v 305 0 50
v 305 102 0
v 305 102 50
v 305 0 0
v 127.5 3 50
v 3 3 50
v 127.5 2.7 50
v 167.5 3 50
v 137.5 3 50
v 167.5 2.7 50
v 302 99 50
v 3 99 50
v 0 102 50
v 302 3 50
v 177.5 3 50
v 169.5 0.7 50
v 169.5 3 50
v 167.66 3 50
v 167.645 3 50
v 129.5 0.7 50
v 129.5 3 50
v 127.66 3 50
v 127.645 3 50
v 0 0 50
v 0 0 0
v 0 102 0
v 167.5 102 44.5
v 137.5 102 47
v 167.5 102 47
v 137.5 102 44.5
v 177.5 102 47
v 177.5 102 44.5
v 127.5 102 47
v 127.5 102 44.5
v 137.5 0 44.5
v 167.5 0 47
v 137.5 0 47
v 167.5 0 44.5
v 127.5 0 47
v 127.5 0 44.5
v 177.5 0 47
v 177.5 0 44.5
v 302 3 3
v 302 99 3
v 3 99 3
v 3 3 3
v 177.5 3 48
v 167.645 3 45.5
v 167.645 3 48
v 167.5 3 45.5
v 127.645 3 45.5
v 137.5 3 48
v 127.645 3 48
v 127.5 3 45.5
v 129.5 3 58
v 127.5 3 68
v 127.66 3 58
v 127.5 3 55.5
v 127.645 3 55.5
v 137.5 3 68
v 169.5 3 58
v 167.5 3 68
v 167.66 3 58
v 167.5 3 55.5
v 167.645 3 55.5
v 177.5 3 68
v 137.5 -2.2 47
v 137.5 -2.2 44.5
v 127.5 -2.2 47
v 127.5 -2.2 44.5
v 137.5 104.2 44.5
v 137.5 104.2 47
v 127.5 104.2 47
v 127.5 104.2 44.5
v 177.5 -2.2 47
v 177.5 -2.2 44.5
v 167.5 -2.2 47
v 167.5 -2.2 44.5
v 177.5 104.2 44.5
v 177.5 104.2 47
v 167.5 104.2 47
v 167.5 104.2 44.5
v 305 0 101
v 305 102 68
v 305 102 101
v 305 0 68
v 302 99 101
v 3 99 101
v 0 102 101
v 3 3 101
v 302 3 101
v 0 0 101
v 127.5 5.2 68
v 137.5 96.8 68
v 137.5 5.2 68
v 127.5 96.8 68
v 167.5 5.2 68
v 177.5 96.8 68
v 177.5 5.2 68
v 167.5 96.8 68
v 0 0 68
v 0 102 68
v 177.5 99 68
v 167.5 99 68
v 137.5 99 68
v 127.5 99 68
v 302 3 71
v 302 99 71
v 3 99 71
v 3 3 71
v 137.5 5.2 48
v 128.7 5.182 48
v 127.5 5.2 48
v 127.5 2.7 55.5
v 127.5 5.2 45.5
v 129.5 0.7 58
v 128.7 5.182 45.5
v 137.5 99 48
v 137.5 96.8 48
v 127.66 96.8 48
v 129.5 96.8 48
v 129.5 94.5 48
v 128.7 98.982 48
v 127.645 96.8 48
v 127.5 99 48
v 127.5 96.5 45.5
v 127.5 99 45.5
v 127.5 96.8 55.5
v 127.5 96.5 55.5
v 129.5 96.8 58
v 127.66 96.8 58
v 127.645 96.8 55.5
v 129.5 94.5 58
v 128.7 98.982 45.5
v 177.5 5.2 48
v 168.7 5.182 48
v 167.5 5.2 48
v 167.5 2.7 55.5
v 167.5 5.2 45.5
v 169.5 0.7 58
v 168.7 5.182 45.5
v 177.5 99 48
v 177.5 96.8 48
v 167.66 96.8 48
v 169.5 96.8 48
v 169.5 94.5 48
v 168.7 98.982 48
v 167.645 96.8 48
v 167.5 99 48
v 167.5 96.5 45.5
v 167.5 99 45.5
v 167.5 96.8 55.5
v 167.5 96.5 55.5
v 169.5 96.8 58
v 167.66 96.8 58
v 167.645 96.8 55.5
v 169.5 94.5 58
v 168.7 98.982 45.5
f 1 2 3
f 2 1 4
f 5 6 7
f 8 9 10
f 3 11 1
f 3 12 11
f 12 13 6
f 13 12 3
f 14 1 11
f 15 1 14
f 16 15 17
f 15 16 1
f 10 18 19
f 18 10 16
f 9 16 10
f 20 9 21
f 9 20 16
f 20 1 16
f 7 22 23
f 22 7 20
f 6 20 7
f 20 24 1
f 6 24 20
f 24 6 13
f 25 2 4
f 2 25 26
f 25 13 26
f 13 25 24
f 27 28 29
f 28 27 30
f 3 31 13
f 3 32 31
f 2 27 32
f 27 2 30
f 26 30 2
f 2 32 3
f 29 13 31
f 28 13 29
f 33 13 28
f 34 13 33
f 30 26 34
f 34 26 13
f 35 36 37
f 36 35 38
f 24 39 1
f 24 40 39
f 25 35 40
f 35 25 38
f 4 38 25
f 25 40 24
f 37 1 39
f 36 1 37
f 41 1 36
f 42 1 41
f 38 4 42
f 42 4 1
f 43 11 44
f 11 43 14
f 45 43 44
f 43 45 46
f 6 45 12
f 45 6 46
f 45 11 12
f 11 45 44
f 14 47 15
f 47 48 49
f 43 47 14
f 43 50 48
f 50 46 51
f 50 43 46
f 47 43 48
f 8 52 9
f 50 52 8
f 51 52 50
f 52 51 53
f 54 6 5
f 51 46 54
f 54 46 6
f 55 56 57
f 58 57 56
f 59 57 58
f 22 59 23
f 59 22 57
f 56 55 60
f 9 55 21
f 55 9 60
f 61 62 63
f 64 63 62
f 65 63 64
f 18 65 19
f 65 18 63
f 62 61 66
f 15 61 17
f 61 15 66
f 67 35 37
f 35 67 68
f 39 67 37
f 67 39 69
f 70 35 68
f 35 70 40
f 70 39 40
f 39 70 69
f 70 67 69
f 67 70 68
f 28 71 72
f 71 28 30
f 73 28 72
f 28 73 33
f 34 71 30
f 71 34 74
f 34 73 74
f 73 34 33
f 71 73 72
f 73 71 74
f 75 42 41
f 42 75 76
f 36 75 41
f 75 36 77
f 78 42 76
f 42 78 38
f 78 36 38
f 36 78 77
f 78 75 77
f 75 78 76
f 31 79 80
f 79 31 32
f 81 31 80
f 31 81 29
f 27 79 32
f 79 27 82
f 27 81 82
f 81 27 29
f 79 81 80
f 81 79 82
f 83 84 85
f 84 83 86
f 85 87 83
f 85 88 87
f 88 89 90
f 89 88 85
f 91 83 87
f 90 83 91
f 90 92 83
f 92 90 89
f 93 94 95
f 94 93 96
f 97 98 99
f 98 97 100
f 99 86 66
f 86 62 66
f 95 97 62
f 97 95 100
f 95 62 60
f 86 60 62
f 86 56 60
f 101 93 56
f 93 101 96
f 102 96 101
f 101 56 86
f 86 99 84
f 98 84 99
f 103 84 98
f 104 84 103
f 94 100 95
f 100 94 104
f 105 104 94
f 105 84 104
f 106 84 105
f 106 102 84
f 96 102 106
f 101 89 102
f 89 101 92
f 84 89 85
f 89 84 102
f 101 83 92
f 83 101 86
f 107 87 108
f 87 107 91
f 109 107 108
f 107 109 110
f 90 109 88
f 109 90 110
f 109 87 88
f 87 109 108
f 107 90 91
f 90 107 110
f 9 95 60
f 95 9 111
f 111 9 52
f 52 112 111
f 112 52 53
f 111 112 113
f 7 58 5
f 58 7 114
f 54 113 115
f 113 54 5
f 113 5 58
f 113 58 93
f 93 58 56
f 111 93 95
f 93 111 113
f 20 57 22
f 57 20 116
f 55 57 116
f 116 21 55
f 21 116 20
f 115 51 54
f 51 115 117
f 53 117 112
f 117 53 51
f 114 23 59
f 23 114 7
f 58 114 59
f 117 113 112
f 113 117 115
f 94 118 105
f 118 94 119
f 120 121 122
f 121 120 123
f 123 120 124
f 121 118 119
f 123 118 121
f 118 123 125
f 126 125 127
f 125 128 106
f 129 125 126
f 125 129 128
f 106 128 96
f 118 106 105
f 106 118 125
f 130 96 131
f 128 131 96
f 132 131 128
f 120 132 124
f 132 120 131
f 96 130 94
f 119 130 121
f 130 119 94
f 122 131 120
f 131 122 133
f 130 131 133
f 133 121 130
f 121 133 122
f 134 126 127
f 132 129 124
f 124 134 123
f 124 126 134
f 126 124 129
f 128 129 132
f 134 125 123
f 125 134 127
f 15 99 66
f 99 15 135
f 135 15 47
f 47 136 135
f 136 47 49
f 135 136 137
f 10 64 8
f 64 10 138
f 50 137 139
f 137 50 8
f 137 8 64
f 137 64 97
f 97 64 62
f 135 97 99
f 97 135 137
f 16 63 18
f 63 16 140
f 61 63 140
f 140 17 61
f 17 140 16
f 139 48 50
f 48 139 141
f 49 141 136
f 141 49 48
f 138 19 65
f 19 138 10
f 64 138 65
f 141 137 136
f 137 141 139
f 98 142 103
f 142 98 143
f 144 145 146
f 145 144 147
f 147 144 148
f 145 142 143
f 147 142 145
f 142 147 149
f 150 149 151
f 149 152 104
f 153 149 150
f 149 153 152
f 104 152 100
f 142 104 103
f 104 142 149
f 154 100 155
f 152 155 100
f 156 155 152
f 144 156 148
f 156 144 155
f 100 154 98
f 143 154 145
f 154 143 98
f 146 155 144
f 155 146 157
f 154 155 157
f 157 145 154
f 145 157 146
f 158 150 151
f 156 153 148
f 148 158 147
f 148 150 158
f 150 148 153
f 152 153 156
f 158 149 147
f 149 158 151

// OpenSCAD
// 03_finger_latches.scad
// Flexible finger latches: two pairs of tall, slender cantilever fingers
// on the SHORT ends (Y faces) of the upper tray. Each finger has a wedge
// hook tip that grabs a small ledge printed on the lower tray's end wall.
// The long flexible arm gives easy manual release — just squeeze the pair inward.
// Engage: press down; ramp guides hooks past ledge. Release: pinch pair, lift.

$fn = 36;
EXPLODE = 18;   // 0=engaged, >0=exploded

/* ---- tray dimensions ---- */
LX = 305; LY = 102; LZ = 50;
UX = 305; UY = 102; UZ = 33;
W  = 3;

/* ---- finger params ---- */
FW   = 10;    // finger width
FT   = 2.2;   // finger thickness (flex direction)
FL   = 20;    // free arm length (provides flex)
HOOK_H = 2.5; // hook catch height
HOOK_D = 2.0; // hook protrusion depth
RAMP_A = 40;  // ramp angle (degrees) for self-guiding on press
LEDGE_H = 2.5;
LEDGE_D = 2.2;

// X position: fingers centered on each short end, spaced apart
FSPACING = 40;  // centre-to-centre of finger pair
FX1 = UX/2 - FSPACING/2 - FW/2;
FX2 = UX/2 + FSPACING/2 - FW/2;

module lower_tray() {
    color("SteelBlue", 0.85)
    union() {
        difference() {
            cube([LX, LY, LZ]);
            translate([W, W, W]) cube([LX-2*W, LY-2*W, LZ]);
        }
        // Ledge on front short face (X=0 end... no, short face = Y=0 and Y=LY)
        // Actually short end = Y faces (102mm dimension): two ledges on Y=0 face
        for (xp = [FX1, FX2]) {
            // ledge on front face (Y=0), protrudes outward (-Y)
            translate([xp, -LEDGE_D, LZ - LEDGE_H - FL*0.15])
                cube([FW, LEDGE_D, LEDGE_H]);
            // ledge on back face (Y=LY)
            translate([xp, LY, LZ - LEDGE_H - FL*0.15])
                cube([FW, LEDGE_D, LEDGE_H]);
        }
    }
}

// Single flexible finger with hook tip
// Points in +Y direction (for back face) or -Y (for front face, flip=true)
module finger(flip=false) {
    fy = flip ? -1 : 1;
    color("OrangeRed", 0.92)
    union() {
        // Arm: thin plate, FL tall, FT wide in flex direction, FW wide
        cube([FW, FT, FL]);
        // Hook tip at the bottom of the arm (z=0 end)
        translate([0, FT, 0])
        linear_extrude(FW)
        polygon(points=[
            [0, 0],
            [0, -FL*0.1],
            [HOOK_D, -FL*0.1 - HOOK_H],   // ramp point
            [HOOK_D, 0]                     // tip of hook
        ]);
        // Ramp on lower tip for press-in guidance
        translate([0, FT, -HOOK_H])
        linear_extrude(FW)
        polygon(points=[
            [0, 0],
            [HOOK_D*0.6, -HOOK_H*tan(RAMP_A/57.3)*0.6],
            [0, -HOOK_H]
        ]);
    }
}

module upper_tray() {
    color("Tomato", 0.85)
    difference() {
        cube([UX, UY, UZ]);
        translate([W, W, W]) cube([UX-2*W, UY-2*W, UZ]);
    }
}

module upper_fingers() {
    // Fingers hang down from bottom of upper tray on short ends
    // Front end (Y=0): fingers point in -Y, hook catches ledge on lower tray front face
    for (xp = [FX1, FX2]) {
        // Front face: arm flush with Y=0, hook points outward (-Y = flip)
        translate([xp, W, -FL])
        rotate([0, 0, 0])
        finger(flip=false);

        // Back face: arm flush with Y=UY, hook points outward (+Y)
        translate([xp, UY - W - FT, -FL])
        finger(flip=false);
    }
}

/* ---- assembly ---- */
lower_tray();
translate([0, 0, LZ + EXPLODE]) {
    upper_tray();
    upper_fingers();
}
